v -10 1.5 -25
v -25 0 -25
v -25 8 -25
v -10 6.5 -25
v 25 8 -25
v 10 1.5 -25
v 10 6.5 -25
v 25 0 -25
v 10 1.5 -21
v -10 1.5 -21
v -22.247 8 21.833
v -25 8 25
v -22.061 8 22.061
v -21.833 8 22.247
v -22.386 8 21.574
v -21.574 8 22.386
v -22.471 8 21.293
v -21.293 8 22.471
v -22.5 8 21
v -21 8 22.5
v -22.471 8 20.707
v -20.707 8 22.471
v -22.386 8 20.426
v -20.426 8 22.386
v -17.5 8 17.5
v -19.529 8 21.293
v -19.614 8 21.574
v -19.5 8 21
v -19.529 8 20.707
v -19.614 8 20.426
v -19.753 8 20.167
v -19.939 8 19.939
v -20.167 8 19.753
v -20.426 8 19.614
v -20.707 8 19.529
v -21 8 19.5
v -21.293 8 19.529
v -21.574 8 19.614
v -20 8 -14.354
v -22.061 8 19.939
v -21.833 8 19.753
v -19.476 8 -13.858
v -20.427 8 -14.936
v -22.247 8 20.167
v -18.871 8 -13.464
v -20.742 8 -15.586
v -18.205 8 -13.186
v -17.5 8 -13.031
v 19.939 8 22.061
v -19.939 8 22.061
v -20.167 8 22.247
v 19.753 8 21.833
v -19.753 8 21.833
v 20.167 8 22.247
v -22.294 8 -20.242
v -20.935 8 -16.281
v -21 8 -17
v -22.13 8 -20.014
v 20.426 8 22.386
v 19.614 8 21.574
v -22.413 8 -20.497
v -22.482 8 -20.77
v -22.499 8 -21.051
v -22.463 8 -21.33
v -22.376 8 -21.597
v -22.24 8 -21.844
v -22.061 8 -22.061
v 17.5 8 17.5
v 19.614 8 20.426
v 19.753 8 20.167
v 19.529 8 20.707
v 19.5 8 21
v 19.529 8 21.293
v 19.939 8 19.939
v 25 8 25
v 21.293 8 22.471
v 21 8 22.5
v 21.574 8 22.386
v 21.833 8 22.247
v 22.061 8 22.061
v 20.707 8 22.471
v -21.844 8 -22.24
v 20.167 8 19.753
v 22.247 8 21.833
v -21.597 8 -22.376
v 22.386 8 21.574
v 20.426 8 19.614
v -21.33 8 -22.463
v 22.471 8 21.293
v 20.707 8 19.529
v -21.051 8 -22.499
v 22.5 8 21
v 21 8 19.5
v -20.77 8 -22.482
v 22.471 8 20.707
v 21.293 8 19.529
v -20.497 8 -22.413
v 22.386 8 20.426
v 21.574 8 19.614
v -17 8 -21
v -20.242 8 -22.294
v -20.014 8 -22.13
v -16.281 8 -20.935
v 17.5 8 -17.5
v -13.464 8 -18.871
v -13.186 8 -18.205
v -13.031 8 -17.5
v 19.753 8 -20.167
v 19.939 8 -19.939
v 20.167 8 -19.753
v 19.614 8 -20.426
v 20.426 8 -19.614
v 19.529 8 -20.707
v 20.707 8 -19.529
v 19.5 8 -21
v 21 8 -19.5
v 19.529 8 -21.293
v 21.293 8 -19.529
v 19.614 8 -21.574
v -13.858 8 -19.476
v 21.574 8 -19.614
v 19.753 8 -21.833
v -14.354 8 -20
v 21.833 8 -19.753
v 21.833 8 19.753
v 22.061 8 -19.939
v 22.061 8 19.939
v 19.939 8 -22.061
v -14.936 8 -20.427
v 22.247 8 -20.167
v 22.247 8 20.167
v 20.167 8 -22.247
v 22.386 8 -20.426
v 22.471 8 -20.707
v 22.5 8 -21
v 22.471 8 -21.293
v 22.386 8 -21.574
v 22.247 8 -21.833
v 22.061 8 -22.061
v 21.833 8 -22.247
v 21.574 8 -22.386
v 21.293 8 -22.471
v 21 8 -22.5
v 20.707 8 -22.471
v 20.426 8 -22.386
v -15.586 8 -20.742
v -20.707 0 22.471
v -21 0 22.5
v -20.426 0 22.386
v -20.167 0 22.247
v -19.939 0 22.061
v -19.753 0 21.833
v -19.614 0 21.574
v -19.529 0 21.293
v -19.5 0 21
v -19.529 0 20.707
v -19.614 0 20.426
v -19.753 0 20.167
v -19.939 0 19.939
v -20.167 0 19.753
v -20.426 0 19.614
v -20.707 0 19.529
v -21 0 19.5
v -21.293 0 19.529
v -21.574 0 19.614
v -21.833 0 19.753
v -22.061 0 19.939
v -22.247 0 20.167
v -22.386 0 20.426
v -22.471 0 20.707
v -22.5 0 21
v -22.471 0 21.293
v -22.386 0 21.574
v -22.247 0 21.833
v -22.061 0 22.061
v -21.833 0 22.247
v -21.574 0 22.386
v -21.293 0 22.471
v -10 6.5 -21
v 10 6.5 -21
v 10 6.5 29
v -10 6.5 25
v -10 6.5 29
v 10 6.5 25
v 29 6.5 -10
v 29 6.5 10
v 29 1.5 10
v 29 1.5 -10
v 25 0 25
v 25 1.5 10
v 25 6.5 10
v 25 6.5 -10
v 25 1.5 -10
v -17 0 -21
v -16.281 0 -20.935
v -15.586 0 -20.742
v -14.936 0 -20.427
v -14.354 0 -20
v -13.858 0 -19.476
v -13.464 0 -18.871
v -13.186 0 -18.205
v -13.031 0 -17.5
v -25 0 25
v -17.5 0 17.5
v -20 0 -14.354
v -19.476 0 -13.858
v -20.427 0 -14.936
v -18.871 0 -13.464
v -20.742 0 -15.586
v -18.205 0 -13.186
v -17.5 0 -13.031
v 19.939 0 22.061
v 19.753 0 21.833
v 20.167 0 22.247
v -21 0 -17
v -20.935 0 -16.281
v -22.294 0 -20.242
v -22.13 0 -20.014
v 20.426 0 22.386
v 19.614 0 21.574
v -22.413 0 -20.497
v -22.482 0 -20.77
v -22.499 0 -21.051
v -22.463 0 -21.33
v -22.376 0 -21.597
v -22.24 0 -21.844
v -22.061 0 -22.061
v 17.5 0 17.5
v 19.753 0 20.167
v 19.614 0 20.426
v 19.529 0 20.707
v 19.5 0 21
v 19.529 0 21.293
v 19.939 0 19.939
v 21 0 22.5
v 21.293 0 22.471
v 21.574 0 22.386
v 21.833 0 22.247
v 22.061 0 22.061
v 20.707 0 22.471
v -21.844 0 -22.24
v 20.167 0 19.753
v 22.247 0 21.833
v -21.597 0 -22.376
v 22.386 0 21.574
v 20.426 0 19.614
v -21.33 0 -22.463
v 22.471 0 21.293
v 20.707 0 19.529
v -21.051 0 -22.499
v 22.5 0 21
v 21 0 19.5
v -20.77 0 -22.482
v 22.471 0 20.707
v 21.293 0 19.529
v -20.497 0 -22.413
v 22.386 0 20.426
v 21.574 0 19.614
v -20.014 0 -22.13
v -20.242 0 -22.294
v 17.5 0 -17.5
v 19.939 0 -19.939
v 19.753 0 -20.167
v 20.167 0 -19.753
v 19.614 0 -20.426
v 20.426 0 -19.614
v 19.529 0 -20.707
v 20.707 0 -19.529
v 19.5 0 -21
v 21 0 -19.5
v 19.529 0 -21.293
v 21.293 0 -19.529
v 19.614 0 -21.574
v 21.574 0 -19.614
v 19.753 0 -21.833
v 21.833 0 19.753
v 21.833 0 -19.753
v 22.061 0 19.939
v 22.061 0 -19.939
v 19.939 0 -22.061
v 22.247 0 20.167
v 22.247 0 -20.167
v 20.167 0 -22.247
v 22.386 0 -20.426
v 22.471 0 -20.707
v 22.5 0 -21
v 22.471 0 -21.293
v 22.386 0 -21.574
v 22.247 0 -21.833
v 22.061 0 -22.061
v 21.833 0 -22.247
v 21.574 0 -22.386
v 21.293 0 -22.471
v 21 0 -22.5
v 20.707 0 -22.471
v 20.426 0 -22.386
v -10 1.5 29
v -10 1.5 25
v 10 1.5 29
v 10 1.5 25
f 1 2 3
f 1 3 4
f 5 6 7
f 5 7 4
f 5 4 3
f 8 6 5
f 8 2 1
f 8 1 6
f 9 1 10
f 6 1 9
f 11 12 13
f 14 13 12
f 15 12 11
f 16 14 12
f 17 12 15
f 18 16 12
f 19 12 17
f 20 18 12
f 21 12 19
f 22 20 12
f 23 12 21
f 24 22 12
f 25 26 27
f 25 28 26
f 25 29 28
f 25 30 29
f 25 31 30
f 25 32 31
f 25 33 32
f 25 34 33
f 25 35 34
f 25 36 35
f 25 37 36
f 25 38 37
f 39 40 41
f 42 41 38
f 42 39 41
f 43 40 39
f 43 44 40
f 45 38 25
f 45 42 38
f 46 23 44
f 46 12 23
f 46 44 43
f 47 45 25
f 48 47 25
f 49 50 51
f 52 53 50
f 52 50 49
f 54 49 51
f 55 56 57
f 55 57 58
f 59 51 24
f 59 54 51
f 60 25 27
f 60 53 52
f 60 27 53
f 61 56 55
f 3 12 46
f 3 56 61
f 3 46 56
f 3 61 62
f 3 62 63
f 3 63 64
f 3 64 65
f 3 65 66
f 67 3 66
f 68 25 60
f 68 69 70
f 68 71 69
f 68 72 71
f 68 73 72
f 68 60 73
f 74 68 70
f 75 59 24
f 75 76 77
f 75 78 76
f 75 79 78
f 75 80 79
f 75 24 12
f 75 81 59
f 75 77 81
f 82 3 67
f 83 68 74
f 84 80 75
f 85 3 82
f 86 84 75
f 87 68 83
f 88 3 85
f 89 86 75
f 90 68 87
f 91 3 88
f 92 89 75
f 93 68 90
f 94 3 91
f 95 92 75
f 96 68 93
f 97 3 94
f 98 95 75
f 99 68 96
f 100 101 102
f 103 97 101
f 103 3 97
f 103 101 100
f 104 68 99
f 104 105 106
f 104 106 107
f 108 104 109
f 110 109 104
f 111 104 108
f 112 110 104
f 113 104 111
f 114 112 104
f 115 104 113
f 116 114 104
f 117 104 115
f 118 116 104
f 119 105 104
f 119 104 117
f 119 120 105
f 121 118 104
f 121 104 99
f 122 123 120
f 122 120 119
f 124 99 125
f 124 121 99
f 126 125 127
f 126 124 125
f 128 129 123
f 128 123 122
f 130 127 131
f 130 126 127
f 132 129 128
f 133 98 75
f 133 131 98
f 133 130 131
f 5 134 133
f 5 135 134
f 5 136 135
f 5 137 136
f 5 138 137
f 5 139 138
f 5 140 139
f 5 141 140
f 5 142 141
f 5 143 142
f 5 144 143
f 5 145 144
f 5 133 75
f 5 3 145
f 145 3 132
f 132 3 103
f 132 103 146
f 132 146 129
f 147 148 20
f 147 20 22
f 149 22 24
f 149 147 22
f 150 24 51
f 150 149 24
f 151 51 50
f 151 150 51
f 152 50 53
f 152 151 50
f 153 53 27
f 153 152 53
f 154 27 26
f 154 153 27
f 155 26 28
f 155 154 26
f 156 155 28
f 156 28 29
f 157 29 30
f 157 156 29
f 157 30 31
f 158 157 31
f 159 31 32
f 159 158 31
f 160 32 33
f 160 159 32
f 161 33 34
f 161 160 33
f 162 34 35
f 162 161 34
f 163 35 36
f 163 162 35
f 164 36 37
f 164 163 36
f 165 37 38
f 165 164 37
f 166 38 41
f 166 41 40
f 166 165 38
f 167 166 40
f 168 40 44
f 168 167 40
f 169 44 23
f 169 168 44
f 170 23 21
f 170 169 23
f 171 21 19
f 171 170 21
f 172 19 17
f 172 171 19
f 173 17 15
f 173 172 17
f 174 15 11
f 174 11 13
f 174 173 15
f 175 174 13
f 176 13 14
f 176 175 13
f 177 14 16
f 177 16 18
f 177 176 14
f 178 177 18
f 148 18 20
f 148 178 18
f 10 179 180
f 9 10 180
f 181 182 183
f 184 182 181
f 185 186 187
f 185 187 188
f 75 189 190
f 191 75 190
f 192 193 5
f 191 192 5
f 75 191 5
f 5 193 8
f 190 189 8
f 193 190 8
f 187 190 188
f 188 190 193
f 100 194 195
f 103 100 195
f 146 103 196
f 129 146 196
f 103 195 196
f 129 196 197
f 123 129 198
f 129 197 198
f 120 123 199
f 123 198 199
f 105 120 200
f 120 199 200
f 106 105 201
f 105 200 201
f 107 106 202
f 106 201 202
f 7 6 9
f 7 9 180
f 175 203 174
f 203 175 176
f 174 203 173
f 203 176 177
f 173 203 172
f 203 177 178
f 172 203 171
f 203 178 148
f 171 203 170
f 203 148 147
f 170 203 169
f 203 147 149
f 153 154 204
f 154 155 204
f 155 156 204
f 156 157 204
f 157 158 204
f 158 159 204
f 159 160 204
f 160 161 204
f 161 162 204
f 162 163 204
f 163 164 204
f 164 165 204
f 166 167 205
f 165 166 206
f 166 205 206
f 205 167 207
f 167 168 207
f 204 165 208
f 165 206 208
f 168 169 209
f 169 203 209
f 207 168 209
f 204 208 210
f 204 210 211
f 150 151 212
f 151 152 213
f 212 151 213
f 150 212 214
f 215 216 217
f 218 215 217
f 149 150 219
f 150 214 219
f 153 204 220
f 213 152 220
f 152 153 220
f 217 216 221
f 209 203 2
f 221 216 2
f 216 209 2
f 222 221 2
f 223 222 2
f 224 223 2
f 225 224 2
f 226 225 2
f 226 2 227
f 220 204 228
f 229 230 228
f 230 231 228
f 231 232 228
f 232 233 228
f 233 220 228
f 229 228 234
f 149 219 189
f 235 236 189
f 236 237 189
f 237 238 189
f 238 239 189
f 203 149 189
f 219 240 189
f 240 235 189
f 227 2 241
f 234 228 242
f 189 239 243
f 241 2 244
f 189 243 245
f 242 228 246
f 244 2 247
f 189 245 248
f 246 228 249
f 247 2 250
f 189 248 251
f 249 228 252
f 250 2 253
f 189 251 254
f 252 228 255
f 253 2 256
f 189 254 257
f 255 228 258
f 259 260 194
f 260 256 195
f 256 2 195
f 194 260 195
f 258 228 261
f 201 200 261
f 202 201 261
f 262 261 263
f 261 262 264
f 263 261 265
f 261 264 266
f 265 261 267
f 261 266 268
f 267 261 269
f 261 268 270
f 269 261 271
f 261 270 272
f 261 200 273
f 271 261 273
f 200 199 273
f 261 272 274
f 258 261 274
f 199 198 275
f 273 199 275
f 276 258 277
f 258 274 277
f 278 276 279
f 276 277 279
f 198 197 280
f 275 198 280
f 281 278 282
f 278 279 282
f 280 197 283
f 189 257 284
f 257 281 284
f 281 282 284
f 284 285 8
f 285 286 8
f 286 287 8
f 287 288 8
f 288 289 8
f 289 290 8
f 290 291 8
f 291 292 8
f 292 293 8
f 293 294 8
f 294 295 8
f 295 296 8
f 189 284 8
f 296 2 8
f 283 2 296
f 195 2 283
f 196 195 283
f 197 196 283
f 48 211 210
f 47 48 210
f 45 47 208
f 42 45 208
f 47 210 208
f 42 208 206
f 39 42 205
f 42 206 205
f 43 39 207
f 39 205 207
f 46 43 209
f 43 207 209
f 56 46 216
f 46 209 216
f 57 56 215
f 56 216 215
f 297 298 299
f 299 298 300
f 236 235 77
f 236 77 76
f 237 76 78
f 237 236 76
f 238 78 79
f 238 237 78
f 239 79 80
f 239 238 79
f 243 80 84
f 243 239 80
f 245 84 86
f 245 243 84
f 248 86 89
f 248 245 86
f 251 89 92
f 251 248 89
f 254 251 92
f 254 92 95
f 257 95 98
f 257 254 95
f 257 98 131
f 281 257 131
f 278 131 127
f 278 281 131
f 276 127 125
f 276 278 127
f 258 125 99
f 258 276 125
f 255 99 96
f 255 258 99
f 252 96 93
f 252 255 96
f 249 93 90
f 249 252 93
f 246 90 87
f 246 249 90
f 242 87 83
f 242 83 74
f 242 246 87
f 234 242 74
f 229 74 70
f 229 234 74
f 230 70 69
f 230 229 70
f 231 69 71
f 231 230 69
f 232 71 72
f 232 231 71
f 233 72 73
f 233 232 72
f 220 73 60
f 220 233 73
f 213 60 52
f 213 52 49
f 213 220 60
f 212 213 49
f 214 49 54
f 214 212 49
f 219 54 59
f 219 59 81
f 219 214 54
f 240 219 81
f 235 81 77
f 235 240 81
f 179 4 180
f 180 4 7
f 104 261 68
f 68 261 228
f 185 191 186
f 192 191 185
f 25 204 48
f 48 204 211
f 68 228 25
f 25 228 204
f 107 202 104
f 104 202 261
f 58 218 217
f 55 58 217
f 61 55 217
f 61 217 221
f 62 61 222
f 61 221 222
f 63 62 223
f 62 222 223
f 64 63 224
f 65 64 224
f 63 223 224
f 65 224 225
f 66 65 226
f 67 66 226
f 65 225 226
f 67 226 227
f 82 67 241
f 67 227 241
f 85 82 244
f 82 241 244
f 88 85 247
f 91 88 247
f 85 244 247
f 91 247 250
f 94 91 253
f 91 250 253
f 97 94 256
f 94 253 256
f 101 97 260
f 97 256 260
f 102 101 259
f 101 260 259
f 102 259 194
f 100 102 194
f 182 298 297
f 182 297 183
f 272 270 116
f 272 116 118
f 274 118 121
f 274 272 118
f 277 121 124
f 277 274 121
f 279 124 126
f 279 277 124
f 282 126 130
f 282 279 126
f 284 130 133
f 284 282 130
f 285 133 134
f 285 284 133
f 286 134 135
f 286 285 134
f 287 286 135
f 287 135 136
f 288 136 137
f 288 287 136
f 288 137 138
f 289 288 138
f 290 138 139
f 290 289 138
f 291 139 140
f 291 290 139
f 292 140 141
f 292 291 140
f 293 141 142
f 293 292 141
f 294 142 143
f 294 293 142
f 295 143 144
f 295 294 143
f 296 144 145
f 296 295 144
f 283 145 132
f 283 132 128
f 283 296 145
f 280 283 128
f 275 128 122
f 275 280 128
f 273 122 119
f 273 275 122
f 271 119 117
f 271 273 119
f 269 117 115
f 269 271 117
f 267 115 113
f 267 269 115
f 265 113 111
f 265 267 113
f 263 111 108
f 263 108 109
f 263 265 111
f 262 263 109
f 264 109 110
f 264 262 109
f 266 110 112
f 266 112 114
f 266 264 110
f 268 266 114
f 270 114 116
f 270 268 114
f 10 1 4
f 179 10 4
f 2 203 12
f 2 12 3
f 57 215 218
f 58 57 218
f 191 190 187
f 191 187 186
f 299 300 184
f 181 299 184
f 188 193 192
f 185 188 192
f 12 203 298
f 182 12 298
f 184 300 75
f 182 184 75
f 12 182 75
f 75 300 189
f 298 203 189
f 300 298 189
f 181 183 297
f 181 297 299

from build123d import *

# Parameters (mm, degrees)
SKETCH1_W         = 50
SKETCH1_H         = 50
SKETCH1_R         = 1.5
SUPPORT_DEPTH     = 8
NORTH_START       = -25
SKETCH2_W         = 20
SKETCH2_H         = 5
NORTH_CUT_DEPTH   = 4
SOUTH_START       = 25
SKETCH2_2_W       = 20
SKETCH2_2_H       = 5
SOUTH_DOWEL_DEPTH = 4
WEST_START        = 25
SKETCH3_W         = 20
SKETCH3_H         = 5
WEST_DOWEL_DEPTH  = 4


with BuildPart() as part:
    # Sketch1 → Support (new body)
    with BuildSketch(Plane(origin=(0, 0, 0), x_dir=(1, 0, 0), z_dir=(0, 1, 0))):
        Rectangle(SKETCH1_W, SKETCH1_H)
        with Locations(Location((-21, -21, 0), (0, 0, 270))):
            Circle(SKETCH1_R, mode=Mode.SUBTRACT)
        with Locations(Location((21, -21, 0), (0, 0, 270))):
            Circle(SKETCH1_R, mode=Mode.SUBTRACT)
        with BuildLine():
            Line((-13.031373033, 17.5), (17.5, 17.5))
            Line((17.5, 17.5), (17.5, -17.5))
            Line((17.5, -17.5), (-17.5, -17.5))
            Line((-17.5, -17.5), (-17.5, 13.031373033))
            ThreePointArc((-17.5, 13.031373033), (-20, 14.354248689), (-21, 17))
            Line((-21, 17), (-22.130136986, 20.01369863))
            ThreePointArc((-22.130136986, 20.01369863), (-22.060660172, 22.060660172), (-20.01369863, 22.130136986))
            Line((-20.01369863, 22.130136986), (-17, 21))
            ThreePointArc((-17, 21), (-14.354248689, 20), (-13.031373033, 17.5))
        make_face(mode=Mode.SUBTRACT)
        with Locations(Location((21, 21, 0), (0, 0, 270))):
            Circle(SKETCH1_R, mode=Mode.SUBTRACT)
    extrude(amount=SUPPORT_DEPTH)

    # Sketch2 → North Cut (cut)
    with BuildSketch(Plane.XY.offset(NORTH_START)):
        with Locations((0, 4)):
            Rectangle(SKETCH2_W, SKETCH2_H)
    extrude(amount=NORTH_CUT_DEPTH, mode=Mode.SUBTRACT)

    # Sketch2<2> → South Dowel (add)
    with BuildSketch(Plane.XY.offset(SOUTH_START)):
        with Locations((0, 4)):
            Rectangle(SKETCH2_2_W, SKETCH2_2_H)
    extrude(amount=SOUTH_DOWEL_DEPTH)

    # Sketch3 → West Dowel (add)
    with BuildSketch(Plane(origin=(0, 0, 0), x_dir=(0, 0, -1), z_dir=(1, 0, 0)).offset(WEST_START)):
        with Locations((0, 4)):
            Rectangle(SKETCH3_W, SKETCH3_H)
    extrude(amount=WEST_DOWEL_DEPTH)


solid = part.part
